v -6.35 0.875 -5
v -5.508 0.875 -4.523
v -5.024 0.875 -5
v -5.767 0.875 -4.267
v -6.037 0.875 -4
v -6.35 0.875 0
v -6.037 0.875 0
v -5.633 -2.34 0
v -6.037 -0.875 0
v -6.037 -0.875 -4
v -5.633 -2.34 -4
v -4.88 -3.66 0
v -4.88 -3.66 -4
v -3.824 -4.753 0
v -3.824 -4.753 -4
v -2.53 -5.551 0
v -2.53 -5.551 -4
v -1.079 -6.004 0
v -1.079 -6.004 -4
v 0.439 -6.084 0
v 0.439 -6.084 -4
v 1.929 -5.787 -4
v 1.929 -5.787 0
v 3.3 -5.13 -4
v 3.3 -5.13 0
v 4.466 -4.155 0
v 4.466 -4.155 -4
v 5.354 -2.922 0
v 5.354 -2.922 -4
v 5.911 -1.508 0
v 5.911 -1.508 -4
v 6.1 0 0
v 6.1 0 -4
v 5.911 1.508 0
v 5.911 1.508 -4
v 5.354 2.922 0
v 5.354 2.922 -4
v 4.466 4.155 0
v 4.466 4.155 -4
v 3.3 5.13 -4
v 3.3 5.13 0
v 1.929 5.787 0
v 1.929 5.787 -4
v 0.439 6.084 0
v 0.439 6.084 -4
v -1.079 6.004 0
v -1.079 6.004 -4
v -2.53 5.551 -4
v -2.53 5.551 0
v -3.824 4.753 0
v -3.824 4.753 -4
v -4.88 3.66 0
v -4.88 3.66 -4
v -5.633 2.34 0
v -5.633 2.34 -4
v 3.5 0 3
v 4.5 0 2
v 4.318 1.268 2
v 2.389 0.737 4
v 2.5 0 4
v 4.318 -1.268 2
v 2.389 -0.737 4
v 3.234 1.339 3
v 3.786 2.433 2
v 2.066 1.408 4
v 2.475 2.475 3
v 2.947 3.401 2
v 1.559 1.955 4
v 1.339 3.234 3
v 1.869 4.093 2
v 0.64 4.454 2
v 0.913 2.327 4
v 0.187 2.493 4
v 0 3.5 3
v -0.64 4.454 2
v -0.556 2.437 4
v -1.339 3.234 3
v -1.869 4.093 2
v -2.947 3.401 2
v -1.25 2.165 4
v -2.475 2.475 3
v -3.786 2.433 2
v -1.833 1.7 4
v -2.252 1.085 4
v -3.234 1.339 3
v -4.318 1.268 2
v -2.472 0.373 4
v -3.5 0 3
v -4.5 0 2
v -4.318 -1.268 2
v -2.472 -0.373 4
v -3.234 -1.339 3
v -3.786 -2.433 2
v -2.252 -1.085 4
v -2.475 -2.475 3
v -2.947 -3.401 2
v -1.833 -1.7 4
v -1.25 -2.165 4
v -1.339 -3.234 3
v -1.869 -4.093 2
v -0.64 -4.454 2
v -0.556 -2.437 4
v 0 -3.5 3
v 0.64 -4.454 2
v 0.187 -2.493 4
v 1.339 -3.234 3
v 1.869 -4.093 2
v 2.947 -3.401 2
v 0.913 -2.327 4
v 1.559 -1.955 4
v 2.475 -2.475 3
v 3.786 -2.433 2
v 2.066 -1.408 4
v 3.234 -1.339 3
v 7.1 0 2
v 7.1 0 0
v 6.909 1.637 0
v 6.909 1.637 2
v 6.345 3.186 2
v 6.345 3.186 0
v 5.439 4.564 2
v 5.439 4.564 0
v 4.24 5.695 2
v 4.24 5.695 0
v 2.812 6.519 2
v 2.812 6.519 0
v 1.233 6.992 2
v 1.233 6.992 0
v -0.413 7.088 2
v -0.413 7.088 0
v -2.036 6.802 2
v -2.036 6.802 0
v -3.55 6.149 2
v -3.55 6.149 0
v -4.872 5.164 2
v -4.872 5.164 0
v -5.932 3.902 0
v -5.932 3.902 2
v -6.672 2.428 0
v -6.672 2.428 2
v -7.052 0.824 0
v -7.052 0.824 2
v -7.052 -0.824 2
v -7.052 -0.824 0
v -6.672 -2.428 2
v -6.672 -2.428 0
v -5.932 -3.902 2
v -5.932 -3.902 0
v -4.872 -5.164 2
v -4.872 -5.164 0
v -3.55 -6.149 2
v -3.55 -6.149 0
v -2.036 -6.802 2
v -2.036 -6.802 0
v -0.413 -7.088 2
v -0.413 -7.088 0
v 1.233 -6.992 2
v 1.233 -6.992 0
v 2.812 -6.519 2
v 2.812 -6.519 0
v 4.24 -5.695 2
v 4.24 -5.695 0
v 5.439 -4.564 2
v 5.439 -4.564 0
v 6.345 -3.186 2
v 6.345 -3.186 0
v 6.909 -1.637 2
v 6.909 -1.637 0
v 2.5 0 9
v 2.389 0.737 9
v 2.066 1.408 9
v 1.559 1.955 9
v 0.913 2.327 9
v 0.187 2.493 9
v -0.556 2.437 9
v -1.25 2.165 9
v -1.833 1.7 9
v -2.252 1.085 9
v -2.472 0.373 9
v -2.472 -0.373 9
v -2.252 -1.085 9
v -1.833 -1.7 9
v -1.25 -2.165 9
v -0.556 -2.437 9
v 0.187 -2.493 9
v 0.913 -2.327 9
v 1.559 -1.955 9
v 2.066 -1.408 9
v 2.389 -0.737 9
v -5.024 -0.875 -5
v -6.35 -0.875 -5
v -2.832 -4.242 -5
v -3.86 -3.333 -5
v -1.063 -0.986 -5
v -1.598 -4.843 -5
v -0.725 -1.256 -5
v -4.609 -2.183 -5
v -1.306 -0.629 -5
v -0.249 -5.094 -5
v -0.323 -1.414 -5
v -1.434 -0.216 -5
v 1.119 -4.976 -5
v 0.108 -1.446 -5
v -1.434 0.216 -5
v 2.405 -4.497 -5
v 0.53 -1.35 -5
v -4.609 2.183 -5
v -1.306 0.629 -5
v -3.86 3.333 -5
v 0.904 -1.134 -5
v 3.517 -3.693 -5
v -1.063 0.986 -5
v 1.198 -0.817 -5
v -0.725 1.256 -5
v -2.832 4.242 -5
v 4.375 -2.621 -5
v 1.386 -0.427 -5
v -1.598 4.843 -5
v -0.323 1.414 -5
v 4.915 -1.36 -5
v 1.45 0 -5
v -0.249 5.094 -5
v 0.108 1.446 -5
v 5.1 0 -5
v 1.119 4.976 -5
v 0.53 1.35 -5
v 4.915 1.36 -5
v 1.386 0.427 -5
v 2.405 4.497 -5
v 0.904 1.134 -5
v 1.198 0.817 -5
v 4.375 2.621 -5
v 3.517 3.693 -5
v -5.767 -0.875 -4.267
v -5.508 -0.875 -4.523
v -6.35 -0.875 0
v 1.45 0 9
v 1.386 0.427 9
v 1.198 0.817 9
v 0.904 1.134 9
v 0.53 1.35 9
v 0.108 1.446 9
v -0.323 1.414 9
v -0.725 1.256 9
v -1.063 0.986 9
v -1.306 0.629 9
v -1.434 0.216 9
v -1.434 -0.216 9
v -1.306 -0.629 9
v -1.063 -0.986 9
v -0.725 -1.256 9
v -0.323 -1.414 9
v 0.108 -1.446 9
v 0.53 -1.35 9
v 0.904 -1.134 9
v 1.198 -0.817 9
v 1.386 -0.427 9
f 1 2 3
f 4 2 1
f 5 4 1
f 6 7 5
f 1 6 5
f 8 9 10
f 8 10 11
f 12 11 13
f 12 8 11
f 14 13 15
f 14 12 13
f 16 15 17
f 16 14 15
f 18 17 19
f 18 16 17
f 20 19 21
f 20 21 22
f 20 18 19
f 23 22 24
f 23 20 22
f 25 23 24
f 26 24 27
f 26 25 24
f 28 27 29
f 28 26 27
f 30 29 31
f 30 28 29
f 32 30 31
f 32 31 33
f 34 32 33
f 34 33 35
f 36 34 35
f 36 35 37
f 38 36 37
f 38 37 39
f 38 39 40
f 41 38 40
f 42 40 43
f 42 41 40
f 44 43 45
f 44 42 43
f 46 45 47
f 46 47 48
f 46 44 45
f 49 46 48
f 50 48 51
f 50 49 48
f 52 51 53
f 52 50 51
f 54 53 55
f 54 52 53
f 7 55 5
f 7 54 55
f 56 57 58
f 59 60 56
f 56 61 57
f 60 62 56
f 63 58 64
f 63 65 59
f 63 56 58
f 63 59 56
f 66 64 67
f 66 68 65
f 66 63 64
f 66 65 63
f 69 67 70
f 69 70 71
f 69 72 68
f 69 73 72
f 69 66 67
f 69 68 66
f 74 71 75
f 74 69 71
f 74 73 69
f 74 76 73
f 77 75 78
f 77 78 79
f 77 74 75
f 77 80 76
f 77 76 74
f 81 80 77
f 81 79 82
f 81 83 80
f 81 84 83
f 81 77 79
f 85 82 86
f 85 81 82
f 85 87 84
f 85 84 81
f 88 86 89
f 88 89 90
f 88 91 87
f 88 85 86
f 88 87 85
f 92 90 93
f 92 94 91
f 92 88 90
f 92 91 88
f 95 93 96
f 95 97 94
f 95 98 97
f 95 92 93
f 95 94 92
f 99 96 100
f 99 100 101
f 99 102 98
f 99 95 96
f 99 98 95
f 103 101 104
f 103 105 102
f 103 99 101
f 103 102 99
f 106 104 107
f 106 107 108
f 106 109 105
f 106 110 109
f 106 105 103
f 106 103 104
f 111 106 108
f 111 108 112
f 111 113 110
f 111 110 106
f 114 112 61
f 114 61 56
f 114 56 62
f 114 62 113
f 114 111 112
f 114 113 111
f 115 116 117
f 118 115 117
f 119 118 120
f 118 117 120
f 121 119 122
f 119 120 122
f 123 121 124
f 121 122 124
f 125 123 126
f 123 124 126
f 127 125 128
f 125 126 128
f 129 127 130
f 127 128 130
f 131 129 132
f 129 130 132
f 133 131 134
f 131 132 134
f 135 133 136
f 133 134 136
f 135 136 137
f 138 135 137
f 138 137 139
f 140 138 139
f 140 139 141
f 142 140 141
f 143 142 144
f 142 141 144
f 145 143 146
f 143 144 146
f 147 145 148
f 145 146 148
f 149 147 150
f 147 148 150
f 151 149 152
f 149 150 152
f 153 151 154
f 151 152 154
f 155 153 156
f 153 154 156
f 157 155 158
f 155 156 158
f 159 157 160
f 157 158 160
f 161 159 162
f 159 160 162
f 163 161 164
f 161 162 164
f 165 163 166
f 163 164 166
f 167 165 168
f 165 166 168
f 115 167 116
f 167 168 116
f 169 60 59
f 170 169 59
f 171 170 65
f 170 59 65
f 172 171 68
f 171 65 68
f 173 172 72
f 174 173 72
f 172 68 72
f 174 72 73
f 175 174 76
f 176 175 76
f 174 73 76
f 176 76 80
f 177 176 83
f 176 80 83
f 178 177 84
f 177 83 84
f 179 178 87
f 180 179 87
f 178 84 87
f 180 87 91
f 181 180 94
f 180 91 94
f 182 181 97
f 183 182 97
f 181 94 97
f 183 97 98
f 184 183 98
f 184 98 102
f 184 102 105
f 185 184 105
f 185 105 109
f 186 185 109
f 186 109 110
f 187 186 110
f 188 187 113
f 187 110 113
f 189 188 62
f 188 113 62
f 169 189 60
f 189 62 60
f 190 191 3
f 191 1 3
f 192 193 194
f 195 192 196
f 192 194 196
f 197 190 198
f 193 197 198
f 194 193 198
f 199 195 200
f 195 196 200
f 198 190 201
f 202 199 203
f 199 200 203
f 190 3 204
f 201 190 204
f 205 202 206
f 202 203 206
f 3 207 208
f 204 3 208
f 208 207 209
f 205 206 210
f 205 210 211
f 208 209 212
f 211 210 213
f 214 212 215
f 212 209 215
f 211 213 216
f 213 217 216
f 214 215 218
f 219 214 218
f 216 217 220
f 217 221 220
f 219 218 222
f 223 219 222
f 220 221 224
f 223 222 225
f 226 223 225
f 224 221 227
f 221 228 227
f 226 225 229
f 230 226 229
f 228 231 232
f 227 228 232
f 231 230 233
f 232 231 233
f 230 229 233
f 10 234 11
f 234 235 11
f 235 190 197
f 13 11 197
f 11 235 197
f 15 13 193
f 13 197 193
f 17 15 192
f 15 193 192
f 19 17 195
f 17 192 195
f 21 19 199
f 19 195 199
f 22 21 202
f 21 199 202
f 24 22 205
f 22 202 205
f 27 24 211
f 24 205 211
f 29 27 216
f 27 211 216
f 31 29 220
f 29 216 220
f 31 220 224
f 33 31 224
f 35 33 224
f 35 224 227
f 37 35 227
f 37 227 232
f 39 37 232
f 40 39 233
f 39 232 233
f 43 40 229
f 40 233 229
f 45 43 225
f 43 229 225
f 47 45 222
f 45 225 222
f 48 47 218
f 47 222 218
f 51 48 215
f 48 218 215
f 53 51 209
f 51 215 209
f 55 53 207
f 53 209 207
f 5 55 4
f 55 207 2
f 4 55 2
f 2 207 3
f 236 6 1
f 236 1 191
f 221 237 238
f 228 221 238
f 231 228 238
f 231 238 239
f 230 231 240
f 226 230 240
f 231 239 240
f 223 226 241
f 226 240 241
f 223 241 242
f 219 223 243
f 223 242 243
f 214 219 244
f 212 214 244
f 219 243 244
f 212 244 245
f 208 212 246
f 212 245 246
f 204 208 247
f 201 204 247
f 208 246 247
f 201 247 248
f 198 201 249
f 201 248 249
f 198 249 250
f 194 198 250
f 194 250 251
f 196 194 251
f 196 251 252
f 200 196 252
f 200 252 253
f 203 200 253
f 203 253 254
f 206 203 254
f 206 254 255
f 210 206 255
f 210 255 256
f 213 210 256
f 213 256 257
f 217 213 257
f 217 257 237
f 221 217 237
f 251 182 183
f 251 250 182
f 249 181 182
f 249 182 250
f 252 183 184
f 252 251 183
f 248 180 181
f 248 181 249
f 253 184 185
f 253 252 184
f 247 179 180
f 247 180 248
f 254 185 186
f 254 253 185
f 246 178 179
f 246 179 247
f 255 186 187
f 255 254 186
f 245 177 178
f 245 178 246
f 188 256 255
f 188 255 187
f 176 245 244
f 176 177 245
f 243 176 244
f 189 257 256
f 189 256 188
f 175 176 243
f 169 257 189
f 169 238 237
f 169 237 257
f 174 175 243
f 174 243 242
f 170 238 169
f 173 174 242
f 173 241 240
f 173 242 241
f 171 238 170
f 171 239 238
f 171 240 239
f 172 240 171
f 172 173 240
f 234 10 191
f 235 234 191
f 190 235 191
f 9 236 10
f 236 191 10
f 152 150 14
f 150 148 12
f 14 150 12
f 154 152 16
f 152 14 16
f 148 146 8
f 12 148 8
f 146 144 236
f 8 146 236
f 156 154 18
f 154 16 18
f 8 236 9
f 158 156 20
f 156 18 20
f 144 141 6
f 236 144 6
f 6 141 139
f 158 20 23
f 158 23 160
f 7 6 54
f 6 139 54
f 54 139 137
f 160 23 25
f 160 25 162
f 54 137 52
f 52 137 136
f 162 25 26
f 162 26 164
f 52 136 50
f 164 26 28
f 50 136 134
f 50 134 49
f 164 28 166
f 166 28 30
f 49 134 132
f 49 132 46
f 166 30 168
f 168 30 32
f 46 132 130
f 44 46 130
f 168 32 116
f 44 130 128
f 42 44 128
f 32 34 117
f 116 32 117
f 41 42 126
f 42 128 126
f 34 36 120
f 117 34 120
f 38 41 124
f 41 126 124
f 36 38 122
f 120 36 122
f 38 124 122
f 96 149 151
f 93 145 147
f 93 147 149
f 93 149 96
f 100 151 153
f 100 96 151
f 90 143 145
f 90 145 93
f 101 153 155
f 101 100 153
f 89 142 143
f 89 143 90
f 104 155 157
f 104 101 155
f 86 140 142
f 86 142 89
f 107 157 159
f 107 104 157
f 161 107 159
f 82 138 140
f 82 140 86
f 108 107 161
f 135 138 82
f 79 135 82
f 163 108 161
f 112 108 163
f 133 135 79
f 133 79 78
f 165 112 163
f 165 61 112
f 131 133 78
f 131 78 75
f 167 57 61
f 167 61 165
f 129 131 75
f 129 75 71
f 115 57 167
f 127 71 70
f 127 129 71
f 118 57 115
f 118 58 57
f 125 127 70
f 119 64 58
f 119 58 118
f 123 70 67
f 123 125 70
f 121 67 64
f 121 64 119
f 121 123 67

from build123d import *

# Parameters (mm, degrees)
EXTRUDE_1_DEPTH     = 5
SKETCH_2_R          = 7.1
EXTRUDE_2_DEPTH     = 2
SKETCH_3_R          = 2.5
EXTRUDE_3_DEPTH     = 7
CHAMFER_1_SIZE      = 2
SKETCH_4_R          = 1.45
CUT_EXTRUDE_1_DEPTH = 30
CHAMFER_2_SIZE      = 1


with BuildPart() as part:
    # ｽｹｯﾁ1 → ﾎﾞｽ - 押し出し1 (new body)
    with BuildSketch(Plane.XY):
        with BuildLine():
            Line((-6.35, -0.875), (-6.036917674, -0.875))
            ThreePointArc((-6.036917674, -0.875), (6.1, 0), (-6.036917674, 0.875))
            Line((-6.036917674, 0.875), (-6.35, 0.875))
            Line((-6.35, 0.875), (-6.35, -0.875))
        make_face()
    extrude(amount=-EXTRUDE_1_DEPTH)

    # ｽｹｯﾁ2 → ﾎﾞｽ - 押し出し2 (add)
    with BuildSketch(Plane.XY):
        Circle(SKETCH_2_R)
    extrude(amount=EXTRUDE_2_DEPTH)

    # ｽｹｯﾁ3 → ﾎﾞｽ - 押し出し3 (add)
    with BuildSketch(Plane.XY.offset(2)):
        Circle(SKETCH_3_R)
    extrude(amount=EXTRUDE_3_DEPTH)

    # 面取り1
    chamfer_1_edges = [part.edges().sort_by_distance(p)[0] for p in [
        (-2.5, 0, 2),
    ]]
    chamfer(chamfer_1_edges, length=CHAMFER_1_SIZE)

    # ｽｹｯﾁ4 → ｶｯﾄ - 押し出し1 (cut)
    with BuildSketch(Plane.XY.offset(9)):
        Circle(SKETCH_4_R)
    extrude(amount=-CUT_EXTRUDE_1_DEPTH, mode=Mode.SUBTRACT)

    # 面取り2
    chamfer_2_edges = [part.edges().sort_by_distance(p)[0] for p in [
        (6.1, 0, -5),
    ]]
    chamfer(chamfer_2_edges, length=CHAMFER_2_SIZE)


solid = part.part
